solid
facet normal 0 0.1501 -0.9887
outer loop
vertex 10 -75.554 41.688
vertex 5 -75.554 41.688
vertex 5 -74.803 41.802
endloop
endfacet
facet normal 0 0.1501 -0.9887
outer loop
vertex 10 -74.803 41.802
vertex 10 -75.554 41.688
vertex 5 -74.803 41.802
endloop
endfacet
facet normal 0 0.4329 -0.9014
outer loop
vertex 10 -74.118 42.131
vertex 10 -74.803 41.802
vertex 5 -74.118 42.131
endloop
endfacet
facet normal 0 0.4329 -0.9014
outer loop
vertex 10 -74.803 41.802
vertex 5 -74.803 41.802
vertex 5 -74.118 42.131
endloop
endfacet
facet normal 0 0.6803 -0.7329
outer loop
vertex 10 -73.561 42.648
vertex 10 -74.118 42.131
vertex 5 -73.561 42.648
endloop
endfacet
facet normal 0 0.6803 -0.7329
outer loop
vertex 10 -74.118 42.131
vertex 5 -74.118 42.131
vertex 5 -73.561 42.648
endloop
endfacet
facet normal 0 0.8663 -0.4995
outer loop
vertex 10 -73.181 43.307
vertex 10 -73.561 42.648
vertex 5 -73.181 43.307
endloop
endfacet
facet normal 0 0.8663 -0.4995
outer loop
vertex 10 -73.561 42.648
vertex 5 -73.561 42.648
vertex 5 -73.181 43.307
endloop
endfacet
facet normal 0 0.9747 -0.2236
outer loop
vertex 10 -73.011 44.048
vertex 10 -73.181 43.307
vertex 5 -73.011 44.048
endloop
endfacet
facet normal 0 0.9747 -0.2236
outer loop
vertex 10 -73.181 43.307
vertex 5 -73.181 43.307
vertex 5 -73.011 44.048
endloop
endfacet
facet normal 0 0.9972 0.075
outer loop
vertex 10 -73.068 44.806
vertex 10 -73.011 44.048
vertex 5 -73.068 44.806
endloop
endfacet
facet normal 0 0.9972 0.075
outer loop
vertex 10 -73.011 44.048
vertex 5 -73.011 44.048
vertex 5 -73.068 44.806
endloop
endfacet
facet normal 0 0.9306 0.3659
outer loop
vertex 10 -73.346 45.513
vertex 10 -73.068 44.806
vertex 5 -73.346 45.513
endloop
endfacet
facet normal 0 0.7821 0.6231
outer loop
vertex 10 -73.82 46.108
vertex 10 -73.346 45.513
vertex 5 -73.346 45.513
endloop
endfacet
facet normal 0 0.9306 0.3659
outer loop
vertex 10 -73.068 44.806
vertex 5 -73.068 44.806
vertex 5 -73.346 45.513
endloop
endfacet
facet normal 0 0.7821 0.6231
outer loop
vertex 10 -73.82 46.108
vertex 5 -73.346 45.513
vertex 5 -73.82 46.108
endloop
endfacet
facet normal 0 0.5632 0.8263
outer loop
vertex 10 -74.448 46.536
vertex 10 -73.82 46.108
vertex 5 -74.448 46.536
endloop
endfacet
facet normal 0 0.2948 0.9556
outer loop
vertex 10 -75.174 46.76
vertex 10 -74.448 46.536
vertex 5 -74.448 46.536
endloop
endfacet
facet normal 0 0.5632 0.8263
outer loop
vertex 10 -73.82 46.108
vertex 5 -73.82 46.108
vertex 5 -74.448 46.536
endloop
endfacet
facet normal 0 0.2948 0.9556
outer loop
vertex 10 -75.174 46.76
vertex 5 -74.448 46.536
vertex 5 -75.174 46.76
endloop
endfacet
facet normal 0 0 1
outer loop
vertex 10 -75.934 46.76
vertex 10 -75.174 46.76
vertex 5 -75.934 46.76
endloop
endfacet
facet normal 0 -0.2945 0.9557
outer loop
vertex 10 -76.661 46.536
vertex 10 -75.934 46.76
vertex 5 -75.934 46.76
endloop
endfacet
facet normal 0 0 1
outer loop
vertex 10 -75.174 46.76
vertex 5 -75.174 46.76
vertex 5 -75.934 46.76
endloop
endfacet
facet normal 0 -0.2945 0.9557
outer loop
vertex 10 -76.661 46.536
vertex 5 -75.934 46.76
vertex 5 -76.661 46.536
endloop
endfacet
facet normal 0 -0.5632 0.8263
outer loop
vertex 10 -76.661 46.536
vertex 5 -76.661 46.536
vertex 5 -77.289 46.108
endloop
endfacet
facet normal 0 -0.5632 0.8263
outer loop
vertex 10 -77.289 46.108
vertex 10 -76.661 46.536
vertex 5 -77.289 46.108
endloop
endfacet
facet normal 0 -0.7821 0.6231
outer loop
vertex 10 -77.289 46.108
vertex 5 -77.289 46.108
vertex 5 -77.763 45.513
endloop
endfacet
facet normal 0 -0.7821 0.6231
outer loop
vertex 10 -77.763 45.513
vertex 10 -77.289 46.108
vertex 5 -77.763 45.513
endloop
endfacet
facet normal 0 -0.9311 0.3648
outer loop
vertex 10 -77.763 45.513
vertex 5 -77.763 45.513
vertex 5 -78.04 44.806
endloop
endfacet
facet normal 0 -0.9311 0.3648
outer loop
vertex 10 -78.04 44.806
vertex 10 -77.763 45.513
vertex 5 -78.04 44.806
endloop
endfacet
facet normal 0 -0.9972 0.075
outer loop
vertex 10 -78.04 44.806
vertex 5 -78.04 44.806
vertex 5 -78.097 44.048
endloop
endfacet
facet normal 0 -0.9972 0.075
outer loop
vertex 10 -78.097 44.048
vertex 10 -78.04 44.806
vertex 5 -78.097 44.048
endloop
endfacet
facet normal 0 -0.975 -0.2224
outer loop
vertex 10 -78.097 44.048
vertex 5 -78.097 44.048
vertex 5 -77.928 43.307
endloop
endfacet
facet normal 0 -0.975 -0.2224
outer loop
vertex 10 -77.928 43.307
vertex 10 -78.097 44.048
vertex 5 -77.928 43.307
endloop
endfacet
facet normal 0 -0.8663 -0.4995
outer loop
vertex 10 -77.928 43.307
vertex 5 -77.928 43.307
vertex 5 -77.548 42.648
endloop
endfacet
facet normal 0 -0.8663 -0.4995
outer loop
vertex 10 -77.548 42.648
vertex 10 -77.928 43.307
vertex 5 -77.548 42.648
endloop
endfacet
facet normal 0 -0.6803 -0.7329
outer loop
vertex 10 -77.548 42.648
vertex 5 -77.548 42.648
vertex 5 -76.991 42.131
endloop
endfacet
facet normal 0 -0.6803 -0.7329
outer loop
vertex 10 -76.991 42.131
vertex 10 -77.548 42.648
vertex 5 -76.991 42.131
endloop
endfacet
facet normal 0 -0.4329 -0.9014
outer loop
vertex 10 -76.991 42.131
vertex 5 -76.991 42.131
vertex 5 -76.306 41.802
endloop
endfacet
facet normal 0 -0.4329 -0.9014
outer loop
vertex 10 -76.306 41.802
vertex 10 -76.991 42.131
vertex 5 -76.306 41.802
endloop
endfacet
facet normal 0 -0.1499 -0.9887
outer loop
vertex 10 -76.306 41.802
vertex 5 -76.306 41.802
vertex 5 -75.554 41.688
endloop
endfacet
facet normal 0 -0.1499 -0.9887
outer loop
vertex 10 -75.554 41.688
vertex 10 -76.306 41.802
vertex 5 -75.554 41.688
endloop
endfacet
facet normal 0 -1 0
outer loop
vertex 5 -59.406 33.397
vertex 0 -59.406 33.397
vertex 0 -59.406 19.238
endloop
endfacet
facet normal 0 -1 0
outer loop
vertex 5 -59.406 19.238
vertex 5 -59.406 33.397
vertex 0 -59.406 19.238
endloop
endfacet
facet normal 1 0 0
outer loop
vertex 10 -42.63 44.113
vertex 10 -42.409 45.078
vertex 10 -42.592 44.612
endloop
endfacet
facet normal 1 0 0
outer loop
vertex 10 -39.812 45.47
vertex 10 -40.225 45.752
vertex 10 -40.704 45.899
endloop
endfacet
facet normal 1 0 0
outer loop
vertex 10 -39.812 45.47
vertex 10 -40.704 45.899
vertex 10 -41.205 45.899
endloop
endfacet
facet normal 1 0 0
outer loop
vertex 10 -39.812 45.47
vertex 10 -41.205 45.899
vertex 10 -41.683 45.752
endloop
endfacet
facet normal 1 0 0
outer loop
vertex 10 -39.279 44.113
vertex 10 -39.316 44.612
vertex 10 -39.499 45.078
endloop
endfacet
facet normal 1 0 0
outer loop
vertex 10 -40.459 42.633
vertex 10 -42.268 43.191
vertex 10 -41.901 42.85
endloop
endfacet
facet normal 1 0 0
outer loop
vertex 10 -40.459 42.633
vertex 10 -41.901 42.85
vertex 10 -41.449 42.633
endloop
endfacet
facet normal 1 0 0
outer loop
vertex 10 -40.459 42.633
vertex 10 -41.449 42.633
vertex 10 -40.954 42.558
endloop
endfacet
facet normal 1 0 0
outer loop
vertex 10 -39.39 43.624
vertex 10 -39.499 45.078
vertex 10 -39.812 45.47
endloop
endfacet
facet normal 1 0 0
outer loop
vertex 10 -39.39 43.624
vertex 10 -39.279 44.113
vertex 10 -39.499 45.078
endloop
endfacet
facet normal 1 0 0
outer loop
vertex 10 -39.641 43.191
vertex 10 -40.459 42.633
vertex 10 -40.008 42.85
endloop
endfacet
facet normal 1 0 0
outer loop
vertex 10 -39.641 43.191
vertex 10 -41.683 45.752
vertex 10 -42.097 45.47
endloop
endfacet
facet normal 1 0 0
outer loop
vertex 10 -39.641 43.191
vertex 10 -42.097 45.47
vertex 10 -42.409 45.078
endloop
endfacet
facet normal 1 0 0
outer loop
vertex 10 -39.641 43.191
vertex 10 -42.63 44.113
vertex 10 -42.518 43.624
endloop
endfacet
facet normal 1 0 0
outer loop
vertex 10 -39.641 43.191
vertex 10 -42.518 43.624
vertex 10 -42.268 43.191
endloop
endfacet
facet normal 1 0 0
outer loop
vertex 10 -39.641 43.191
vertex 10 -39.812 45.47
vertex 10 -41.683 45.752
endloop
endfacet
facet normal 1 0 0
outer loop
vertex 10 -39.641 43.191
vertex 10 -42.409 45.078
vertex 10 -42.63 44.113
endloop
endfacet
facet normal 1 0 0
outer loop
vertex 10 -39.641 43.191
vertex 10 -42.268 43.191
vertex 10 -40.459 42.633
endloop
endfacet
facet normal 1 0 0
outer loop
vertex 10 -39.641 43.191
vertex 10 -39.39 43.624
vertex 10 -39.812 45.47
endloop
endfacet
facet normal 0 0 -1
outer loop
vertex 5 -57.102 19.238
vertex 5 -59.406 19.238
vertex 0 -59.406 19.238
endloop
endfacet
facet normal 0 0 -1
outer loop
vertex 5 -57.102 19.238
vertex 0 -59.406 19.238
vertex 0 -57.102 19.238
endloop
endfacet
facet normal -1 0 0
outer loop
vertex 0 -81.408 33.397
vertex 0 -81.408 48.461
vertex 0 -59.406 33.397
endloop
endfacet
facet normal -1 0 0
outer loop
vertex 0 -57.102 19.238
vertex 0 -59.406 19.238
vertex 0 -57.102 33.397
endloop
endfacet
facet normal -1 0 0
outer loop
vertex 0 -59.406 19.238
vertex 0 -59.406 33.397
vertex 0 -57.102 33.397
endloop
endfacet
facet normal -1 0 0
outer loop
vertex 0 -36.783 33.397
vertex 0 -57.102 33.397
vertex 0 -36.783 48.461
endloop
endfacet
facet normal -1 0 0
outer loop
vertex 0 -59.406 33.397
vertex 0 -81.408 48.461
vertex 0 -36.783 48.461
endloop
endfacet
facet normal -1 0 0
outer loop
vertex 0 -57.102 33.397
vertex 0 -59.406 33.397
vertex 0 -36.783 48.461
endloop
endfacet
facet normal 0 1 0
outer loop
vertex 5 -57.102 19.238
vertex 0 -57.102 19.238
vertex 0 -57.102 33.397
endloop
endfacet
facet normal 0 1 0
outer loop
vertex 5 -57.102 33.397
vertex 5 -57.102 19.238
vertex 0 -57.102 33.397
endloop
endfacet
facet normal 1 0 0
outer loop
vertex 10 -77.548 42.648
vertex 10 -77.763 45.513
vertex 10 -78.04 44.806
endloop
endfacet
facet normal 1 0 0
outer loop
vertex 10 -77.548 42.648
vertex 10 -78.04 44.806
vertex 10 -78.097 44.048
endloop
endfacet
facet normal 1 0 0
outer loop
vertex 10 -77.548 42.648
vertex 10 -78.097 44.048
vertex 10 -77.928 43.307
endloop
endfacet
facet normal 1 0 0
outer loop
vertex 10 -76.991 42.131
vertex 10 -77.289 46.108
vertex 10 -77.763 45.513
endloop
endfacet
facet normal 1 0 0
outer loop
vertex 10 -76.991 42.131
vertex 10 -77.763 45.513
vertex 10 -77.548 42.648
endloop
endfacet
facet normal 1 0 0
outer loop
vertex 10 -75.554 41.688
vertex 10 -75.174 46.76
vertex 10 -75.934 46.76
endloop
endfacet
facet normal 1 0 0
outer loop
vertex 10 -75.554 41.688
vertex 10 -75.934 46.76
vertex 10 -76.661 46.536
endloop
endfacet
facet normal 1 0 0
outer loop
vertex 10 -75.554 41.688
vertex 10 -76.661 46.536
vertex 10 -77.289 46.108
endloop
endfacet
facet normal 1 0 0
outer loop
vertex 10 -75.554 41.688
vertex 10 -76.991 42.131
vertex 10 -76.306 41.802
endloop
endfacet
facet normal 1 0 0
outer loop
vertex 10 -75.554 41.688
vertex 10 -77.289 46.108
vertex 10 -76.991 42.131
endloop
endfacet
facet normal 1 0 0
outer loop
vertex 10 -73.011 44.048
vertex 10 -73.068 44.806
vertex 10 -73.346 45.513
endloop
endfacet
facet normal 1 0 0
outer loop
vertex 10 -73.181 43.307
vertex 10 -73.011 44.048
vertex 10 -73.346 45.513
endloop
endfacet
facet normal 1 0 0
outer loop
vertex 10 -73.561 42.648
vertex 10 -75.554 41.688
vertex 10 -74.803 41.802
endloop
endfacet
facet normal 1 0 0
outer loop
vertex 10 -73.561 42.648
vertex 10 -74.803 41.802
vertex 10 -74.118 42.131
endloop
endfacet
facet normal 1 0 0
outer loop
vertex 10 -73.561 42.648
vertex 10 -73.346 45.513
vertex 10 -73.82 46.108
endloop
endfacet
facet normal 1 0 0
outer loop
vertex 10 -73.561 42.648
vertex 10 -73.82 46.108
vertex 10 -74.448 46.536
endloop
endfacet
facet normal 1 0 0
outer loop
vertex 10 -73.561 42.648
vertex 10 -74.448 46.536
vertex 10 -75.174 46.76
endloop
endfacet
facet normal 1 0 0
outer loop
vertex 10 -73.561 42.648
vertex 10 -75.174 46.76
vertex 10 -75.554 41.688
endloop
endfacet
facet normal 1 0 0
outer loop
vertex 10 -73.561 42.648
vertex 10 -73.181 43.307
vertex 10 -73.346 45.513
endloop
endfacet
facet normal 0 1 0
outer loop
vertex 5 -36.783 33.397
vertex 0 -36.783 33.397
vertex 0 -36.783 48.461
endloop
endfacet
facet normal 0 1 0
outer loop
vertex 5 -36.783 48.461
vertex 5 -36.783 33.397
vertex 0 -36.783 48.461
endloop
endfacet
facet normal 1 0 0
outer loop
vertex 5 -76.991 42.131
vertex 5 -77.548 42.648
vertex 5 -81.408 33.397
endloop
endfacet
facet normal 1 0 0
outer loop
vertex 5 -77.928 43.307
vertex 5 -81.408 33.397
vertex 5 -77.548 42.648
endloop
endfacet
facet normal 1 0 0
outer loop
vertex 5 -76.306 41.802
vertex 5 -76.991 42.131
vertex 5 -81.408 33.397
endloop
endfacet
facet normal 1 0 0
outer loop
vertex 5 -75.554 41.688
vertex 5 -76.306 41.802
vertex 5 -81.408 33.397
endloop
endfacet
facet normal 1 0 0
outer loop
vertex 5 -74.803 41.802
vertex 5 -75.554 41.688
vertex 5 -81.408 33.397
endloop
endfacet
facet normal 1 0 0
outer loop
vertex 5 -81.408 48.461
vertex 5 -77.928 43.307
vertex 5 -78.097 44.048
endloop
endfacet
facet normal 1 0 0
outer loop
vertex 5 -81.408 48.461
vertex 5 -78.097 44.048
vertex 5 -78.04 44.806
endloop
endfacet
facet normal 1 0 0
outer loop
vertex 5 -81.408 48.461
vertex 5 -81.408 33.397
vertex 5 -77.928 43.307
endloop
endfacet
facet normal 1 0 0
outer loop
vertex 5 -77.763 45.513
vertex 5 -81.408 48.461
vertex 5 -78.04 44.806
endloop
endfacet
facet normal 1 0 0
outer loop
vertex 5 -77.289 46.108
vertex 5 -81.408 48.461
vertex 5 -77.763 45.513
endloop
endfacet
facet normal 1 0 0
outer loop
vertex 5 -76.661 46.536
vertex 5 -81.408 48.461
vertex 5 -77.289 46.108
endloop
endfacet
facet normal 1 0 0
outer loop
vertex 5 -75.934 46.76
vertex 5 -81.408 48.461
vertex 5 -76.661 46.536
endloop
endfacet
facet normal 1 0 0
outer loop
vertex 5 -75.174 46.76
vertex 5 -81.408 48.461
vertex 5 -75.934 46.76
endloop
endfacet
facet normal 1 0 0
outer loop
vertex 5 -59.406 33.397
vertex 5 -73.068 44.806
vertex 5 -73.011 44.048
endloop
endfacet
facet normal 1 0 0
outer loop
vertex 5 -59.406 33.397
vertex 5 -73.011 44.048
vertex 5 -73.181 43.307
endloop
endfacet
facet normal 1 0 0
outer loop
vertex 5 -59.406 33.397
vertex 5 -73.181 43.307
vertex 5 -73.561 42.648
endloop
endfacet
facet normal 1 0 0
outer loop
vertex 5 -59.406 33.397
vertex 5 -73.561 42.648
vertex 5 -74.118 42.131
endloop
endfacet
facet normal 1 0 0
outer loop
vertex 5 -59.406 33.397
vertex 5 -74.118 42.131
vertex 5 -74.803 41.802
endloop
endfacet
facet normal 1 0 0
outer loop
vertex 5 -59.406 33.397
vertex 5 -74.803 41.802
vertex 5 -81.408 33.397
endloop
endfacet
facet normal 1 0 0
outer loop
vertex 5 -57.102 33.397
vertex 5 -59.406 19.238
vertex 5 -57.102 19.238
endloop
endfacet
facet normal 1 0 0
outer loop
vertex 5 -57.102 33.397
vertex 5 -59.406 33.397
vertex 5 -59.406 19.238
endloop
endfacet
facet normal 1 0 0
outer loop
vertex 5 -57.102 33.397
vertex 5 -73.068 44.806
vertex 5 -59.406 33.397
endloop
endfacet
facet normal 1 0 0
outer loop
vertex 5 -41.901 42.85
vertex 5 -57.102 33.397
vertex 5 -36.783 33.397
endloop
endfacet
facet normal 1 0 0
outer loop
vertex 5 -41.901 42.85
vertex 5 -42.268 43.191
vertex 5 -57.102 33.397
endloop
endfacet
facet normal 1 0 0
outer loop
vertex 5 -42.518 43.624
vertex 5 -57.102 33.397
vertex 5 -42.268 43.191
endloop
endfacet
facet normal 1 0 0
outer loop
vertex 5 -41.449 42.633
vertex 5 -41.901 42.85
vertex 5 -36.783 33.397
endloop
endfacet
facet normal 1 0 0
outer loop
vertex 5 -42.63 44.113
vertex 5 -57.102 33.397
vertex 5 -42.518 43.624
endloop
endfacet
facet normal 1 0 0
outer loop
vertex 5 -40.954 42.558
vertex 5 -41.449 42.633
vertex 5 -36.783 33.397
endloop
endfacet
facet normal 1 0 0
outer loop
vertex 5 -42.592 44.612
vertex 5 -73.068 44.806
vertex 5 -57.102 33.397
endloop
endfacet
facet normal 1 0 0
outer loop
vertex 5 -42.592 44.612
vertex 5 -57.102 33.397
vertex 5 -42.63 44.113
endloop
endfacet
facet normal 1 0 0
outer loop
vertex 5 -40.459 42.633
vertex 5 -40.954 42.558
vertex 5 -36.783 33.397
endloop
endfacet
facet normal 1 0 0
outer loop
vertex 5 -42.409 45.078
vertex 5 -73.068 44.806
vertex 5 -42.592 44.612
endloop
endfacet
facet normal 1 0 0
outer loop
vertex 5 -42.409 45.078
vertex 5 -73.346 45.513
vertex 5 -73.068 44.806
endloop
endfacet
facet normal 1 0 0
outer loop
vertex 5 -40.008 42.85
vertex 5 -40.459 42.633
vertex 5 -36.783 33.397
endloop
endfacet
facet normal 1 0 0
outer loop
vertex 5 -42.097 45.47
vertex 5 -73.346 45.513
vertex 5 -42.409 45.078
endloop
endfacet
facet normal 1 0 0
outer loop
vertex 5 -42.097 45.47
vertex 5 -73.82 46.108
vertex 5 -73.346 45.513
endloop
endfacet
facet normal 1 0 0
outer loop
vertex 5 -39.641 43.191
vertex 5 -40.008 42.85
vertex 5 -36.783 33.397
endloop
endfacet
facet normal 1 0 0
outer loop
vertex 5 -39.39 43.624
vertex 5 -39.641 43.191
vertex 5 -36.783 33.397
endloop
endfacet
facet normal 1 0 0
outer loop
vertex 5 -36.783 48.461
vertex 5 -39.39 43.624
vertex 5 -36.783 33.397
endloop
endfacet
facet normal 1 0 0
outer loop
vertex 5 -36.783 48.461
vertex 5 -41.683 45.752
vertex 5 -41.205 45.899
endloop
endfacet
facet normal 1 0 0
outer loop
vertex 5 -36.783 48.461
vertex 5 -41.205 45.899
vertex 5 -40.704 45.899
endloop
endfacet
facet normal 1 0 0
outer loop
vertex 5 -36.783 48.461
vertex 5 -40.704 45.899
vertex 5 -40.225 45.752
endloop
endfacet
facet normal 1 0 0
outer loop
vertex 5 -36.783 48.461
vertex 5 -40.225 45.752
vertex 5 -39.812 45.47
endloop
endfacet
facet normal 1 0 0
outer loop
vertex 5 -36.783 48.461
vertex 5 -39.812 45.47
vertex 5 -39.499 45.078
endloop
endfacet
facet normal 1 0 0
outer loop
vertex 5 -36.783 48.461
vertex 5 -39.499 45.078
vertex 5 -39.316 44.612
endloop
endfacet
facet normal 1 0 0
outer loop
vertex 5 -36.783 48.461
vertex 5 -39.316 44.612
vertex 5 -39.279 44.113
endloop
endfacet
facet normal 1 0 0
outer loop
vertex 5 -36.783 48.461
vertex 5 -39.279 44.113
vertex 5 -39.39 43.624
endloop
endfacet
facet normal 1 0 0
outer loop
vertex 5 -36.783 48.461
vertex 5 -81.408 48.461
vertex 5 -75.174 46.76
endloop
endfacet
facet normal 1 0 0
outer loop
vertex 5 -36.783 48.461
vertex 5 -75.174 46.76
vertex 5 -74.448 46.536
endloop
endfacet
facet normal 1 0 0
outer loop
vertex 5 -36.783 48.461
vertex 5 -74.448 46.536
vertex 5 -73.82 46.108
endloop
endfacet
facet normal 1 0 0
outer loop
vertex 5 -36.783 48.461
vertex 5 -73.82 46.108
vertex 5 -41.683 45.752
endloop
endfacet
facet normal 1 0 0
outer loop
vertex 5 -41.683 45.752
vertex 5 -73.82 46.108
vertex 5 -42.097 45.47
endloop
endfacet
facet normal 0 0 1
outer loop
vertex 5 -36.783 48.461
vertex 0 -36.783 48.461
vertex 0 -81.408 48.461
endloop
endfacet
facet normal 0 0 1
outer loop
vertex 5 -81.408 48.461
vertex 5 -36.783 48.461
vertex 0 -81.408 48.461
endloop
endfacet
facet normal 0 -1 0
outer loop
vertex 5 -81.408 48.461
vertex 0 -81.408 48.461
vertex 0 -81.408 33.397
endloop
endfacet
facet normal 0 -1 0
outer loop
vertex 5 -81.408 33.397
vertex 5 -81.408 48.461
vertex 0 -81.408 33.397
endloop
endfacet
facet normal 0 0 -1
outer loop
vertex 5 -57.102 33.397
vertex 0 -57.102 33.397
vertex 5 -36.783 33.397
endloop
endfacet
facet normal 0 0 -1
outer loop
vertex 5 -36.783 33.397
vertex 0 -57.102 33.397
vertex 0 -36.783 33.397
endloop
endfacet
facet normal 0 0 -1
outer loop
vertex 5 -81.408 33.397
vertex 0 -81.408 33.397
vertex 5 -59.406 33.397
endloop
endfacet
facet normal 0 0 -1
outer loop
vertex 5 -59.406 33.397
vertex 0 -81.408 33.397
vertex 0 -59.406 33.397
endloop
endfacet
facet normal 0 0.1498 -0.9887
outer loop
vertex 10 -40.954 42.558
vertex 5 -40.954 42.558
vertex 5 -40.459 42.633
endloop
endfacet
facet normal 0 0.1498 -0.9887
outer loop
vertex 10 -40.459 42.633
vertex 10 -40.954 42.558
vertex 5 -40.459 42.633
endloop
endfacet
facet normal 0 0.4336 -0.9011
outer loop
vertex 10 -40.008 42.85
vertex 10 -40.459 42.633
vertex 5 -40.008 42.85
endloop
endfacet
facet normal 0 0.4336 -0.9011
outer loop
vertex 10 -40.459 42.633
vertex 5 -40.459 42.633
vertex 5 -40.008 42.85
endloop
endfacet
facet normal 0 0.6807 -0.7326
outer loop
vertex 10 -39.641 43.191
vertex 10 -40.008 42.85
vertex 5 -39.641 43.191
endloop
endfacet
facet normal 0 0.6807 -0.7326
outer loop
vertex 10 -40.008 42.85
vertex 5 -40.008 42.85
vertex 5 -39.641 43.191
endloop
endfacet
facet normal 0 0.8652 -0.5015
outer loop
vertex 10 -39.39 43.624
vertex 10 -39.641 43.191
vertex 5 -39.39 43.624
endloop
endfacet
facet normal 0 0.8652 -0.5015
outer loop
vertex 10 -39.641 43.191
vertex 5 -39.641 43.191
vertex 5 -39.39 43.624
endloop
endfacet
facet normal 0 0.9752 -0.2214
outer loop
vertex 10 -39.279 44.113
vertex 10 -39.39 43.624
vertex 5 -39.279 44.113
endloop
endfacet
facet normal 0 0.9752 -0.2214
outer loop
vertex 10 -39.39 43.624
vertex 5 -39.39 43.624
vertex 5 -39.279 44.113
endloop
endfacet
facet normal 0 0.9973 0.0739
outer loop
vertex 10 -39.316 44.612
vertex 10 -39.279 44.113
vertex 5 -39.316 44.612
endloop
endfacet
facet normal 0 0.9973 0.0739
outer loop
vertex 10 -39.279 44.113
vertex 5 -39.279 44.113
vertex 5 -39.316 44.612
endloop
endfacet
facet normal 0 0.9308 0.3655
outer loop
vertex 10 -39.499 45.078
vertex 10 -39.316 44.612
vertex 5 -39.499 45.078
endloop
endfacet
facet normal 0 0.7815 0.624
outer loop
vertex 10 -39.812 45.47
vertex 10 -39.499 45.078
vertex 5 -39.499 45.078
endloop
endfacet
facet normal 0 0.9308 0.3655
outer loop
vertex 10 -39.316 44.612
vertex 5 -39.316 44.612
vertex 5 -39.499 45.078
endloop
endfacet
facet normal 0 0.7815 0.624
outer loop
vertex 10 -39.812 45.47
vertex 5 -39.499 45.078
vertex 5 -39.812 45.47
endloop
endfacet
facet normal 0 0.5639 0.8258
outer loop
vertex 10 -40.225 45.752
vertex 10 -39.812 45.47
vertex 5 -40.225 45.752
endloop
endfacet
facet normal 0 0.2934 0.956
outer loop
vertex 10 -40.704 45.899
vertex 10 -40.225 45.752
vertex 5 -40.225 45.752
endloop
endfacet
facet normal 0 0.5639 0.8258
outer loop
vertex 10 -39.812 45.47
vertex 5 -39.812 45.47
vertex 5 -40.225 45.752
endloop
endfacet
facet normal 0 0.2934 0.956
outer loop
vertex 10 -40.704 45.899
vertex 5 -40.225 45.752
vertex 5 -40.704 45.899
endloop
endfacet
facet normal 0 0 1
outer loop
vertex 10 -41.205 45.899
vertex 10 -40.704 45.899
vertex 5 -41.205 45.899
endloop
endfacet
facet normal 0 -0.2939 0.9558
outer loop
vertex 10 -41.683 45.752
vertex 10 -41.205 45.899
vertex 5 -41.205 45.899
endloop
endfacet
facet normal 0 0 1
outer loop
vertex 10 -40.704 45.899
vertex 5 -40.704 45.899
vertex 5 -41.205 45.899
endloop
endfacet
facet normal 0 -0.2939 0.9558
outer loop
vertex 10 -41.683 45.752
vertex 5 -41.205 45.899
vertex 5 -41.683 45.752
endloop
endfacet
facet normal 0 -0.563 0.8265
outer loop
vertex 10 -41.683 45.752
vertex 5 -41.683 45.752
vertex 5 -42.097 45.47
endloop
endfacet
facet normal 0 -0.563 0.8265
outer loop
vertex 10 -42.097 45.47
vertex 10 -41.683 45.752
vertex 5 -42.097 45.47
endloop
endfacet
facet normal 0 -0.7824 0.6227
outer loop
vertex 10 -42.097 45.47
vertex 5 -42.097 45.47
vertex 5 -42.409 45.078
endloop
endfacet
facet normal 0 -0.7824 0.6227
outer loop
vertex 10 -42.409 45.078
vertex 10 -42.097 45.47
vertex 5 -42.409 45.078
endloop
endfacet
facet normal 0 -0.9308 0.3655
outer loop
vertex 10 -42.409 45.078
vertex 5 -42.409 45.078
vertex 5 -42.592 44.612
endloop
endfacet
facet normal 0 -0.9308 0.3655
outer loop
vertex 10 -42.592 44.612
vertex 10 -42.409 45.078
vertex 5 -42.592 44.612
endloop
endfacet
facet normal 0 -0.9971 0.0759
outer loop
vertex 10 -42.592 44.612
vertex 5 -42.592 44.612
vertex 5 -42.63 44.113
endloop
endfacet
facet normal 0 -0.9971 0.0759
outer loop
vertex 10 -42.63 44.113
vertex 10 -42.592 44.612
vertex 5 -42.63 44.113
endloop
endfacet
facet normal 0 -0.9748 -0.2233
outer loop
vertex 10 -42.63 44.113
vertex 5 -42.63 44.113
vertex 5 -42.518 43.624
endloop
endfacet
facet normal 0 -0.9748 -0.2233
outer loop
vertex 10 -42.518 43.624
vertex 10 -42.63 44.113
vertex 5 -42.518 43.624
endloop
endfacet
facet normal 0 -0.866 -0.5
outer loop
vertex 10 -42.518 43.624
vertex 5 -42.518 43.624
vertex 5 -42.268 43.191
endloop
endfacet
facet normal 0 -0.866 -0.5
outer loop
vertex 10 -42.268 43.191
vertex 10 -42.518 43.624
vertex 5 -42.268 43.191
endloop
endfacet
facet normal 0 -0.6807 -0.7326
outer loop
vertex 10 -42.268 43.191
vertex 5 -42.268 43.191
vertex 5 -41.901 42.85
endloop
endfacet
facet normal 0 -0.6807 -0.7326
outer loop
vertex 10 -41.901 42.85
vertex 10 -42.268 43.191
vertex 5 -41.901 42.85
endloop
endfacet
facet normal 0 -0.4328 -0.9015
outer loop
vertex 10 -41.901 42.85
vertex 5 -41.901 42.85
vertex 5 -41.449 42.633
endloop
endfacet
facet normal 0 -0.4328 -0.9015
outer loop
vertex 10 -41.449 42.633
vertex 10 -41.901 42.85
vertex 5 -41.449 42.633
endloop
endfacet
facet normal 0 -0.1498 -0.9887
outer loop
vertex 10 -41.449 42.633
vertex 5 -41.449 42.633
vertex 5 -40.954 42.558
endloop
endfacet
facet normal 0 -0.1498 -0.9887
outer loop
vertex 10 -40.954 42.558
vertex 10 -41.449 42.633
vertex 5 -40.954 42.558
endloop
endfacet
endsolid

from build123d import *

# Parameters (mm, degrees)
SKETCH1_R             = 2.55
BOSS_EXTRUDE1_DEPTH   = 10
SKETCH1_R_2           = 1.68
BOSS_EXTRUDE1_2_DEPTH = 10
SKETCH2_W             = 2.303802682
SKETCH2_H             = 14.158597278
SKETCH2_H_2           = 10.841402722
BOSS_EXTRUDE2_DEPTH   = 5


with BuildPart() as part:
    # Sketch1 → Boss-Extrude1 (new body)
    with BuildSketch(Plane.YZ):
        with Locations(Location((-75.554303292, 44.238232385, 0), (0, 0, 270))):
            Circle(SKETCH1_R)
    extrude(amount=BOSS_EXTRUDE1_DEPTH)



with BuildPart() as body_2:
    # Sketch1 → Boss-Extrude1 2 (new body)
    with BuildSketch(Plane.YZ):
        with Locations(Location((-40.954303292, 44.238232385, 0), (0, 0, 270))):
            Circle(SKETCH1_R_2)
    extrude(amount=BOSS_EXTRUDE1_2_DEPTH)


with BuildPart() as part_1:
    add(part.part)

    add(body_2.part)  # Boss-Extrude2 merges body 2
    # Sketch2 → Boss-Extrude2 (add)
    with BuildSketch(Plane.YZ):
        with Locations((-58.254303292, 26.317531024)):
            Rectangle(SKETCH2_W, SKETCH2_H)
        with Locations((-58.254303292, 38.817531024)):
            Rectangle(SKETCH2_W, SKETCH2_H_2)
        Polygon((-36.783173072, 48.461100861), (-81.407523603, 48.461100861), (-81.407523603, 33.396829663), (-59.406204633, 33.396829663), (-59.406204633, 44.238232385), (-57.102401951, 44.238232385), (-57.102401951, 33.396829663), (-36.783173072, 33.396829663), align=None)
    extrude(amount=BOSS_EXTRUDE2_DEPTH)


solid = part_1.part
